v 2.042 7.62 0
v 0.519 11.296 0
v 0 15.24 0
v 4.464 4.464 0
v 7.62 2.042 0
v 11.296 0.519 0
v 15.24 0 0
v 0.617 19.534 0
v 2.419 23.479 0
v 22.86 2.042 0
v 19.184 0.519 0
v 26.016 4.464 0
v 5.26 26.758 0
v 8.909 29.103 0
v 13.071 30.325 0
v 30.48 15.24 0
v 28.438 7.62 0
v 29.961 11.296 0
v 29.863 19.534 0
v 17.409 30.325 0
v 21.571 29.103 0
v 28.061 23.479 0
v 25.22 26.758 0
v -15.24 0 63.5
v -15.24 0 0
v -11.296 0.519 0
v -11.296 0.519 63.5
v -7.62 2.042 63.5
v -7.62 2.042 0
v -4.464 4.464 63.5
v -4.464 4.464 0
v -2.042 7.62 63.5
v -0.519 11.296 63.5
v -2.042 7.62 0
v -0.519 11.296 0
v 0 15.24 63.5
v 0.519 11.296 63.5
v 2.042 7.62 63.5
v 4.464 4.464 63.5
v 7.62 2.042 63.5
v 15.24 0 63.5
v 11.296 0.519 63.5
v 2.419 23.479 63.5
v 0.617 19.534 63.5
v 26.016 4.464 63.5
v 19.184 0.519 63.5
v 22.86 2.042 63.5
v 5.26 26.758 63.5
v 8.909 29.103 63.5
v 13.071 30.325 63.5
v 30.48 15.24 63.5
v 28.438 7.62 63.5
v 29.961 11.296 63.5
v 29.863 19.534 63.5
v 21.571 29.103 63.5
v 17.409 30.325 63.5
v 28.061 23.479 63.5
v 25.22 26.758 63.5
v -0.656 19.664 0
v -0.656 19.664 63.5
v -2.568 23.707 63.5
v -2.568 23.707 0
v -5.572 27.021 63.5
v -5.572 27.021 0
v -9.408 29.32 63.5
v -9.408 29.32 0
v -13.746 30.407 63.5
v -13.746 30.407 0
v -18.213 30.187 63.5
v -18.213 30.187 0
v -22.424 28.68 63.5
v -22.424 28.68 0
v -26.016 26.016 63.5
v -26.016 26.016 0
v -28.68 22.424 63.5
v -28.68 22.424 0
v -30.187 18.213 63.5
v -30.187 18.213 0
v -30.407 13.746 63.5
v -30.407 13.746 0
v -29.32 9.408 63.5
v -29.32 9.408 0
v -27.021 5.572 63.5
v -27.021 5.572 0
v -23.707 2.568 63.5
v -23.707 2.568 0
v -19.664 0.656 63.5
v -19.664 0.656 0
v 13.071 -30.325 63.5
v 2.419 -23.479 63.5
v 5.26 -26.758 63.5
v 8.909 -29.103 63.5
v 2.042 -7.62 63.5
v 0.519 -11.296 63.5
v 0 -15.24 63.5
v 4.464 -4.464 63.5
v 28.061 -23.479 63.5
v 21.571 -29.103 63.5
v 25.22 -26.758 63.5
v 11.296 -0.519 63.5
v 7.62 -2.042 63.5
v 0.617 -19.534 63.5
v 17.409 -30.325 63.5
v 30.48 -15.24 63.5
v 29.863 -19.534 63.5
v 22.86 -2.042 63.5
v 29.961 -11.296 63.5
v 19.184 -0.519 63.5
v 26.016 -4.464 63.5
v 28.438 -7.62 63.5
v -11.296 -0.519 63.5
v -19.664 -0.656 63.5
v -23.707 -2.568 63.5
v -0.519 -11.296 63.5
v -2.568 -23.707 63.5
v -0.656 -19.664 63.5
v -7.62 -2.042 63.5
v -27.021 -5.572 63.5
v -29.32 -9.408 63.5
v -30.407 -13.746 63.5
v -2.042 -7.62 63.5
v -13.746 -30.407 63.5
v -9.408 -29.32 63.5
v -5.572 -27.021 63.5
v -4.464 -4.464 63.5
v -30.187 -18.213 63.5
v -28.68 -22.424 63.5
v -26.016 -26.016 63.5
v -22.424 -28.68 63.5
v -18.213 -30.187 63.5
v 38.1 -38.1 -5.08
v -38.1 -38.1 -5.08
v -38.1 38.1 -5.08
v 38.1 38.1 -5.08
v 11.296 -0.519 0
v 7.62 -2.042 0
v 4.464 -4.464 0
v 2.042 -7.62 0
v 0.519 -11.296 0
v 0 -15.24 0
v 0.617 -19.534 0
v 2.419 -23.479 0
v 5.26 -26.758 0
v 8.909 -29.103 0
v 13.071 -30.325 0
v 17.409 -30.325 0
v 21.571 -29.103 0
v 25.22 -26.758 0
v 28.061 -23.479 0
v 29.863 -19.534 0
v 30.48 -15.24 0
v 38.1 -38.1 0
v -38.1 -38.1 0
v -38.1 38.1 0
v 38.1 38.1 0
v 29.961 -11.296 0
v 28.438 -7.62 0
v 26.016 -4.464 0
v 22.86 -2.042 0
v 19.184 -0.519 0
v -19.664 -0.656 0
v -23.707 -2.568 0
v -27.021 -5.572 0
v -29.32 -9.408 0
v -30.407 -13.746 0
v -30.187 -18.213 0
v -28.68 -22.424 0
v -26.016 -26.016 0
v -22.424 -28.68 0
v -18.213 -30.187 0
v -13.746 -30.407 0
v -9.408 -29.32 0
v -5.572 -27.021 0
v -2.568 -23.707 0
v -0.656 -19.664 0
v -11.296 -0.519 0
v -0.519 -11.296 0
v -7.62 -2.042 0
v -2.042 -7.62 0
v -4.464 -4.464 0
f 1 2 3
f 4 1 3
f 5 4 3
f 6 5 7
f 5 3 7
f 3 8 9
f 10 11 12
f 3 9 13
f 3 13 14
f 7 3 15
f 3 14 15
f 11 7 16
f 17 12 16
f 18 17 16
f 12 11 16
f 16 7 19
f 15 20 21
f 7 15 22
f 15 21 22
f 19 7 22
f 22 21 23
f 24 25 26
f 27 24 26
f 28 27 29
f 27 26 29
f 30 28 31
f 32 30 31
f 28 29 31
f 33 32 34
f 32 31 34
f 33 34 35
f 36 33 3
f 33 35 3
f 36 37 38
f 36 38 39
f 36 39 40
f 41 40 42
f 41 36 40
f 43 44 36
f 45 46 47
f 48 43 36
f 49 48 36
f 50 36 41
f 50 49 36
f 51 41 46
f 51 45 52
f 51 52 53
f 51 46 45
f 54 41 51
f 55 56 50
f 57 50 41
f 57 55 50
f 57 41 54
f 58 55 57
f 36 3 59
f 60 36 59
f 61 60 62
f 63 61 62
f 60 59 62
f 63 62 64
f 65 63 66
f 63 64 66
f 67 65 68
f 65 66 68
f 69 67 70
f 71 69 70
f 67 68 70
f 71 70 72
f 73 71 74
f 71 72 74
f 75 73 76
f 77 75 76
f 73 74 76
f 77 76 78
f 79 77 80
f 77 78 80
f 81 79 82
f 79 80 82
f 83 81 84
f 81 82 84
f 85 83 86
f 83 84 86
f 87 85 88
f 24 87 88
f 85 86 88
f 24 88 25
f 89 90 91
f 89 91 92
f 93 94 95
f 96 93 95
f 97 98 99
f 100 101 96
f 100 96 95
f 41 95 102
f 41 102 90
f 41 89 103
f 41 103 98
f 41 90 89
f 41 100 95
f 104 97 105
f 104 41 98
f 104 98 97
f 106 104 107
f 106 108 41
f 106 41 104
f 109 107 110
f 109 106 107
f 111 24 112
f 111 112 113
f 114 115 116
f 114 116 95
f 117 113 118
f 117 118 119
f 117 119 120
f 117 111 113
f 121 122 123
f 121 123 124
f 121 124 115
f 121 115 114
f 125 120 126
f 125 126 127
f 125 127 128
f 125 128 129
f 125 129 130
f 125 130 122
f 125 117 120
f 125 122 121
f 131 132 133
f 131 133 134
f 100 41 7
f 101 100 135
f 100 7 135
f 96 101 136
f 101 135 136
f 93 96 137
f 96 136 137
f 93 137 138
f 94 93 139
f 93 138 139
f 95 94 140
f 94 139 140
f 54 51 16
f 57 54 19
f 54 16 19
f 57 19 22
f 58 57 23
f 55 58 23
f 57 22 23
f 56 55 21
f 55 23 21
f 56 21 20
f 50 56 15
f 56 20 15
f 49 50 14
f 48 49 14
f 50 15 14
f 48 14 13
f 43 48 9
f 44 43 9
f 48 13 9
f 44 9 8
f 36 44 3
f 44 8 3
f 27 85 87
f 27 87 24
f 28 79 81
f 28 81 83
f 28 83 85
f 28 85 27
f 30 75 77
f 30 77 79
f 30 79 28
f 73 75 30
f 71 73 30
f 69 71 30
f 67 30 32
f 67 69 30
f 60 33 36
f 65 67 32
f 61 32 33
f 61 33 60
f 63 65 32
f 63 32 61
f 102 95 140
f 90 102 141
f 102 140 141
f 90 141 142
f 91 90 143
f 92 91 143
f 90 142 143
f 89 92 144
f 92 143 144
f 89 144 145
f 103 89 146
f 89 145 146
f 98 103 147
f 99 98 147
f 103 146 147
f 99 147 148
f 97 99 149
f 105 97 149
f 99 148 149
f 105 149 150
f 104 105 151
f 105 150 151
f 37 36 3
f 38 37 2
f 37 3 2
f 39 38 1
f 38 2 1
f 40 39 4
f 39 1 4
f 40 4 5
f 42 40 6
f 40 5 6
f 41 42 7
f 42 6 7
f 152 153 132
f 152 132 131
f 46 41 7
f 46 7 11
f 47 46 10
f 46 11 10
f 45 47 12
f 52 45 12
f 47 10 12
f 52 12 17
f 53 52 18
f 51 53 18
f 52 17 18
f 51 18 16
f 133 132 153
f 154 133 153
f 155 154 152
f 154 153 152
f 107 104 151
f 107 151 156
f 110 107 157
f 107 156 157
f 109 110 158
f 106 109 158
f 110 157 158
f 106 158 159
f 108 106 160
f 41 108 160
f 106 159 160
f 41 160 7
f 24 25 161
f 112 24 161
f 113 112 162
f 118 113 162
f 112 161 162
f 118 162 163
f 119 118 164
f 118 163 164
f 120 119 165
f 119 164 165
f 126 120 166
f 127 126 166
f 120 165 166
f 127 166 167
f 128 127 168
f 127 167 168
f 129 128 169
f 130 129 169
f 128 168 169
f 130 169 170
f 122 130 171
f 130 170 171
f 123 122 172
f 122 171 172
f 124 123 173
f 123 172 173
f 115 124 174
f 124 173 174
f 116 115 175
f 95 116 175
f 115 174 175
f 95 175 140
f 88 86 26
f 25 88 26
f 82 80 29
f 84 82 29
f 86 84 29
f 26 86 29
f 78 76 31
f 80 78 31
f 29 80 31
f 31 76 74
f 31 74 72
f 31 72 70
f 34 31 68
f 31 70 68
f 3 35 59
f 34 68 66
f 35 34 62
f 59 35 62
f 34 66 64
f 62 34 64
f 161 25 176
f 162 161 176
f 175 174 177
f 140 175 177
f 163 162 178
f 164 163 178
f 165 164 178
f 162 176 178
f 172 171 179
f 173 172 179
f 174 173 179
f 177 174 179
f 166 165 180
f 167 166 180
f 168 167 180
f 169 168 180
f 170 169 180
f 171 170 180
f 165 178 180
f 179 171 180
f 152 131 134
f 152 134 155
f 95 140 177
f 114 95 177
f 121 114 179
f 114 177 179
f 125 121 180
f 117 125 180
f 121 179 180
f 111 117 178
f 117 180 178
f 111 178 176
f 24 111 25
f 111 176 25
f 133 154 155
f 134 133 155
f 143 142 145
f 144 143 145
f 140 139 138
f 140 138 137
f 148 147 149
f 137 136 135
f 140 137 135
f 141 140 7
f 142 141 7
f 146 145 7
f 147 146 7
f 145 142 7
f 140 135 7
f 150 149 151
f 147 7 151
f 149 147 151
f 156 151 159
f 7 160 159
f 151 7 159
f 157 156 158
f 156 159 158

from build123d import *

# Parameters (mm, degrees)
F1_DEPTH = 63.5
F2_W     = 76.2
F2_H     = 5.08
F3_DEPTH = 38.1


# Not quite as in the source:
# - a feature names something its author has since deleted; it is built from what else it names


with BuildPart() as f1:
    # F0 (on Top) → F1 (new body)
    with BuildSketch(Plane.XY):
        with BuildLine():
            ThreePointArc((-15.2400000598, 0), (-26.0163073241, -26.0163073664), (0, -15.24))
            ThreePointArc((0, -15.24), (-4.4636926759, -4.4636926336), (-15.2400000598, 0))
        make_face()
    extrude(amount=F1_DEPTH)


with BuildPart() as f1b:
    # F0 (on Top) → F1, piece 2 (new body)
    with BuildSketch(Plane.XY):
        with BuildLine():
            ThreePointArc((15.24, 0), (4.4636926547, -4.4636926547), (0, -15.24))
            ThreePointArc((0, -15.24), (15.24, -30.48), (30.48, -15.24))
            ThreePointArc((30.48, -15.24), (26.0163073453, -4.4636926547), (15.24, 0))
        make_face()
    extrude(amount=F1_DEPTH)


with BuildPart() as f1c:
    # F0 (on Top) → F1, piece 3 (new body)
    with BuildSketch(Plane.XY):
        with BuildLine():
            ThreePointArc((0, 15.24), (-26.0163073241, 26.0163073664), (-15.2400000598, 0))
            ThreePointArc((-15.2400000598, 0), (-4.4636926759, 4.4636926336), (0, 15.24))
        make_face()
    extrude(amount=F1_DEPTH)


with BuildPart() as f1d:
    # F0 (on Top) → F1, piece 4 (new body)
    with BuildSketch(Plane.XY):
        with BuildLine():
            ThreePointArc((0, 15.24), (4.4636926547, 4.4636926547), (15.24, 0))
            ThreePointArc((15.24, 0), (26.0163073453, 4.4636926547), (30.48, 15.24))
            ThreePointArc((30.48, 15.24), (15.24, 30.48), (0, 15.24))
        make_face()
    extrude(amount=F1_DEPTH)


with BuildPart() as f3:
    # F2 (on Front) → F3 (new body, symmetric)
    with BuildSketch(Plane.XZ):
        with Locations((0, -2.54)):
            Rectangle(F2_W, F2_H)
    extrude(amount=F3_DEPTH, both=True)


solid = Compound([f1.part, f1b.part, f1c.part, f1d.part, f3.part])
